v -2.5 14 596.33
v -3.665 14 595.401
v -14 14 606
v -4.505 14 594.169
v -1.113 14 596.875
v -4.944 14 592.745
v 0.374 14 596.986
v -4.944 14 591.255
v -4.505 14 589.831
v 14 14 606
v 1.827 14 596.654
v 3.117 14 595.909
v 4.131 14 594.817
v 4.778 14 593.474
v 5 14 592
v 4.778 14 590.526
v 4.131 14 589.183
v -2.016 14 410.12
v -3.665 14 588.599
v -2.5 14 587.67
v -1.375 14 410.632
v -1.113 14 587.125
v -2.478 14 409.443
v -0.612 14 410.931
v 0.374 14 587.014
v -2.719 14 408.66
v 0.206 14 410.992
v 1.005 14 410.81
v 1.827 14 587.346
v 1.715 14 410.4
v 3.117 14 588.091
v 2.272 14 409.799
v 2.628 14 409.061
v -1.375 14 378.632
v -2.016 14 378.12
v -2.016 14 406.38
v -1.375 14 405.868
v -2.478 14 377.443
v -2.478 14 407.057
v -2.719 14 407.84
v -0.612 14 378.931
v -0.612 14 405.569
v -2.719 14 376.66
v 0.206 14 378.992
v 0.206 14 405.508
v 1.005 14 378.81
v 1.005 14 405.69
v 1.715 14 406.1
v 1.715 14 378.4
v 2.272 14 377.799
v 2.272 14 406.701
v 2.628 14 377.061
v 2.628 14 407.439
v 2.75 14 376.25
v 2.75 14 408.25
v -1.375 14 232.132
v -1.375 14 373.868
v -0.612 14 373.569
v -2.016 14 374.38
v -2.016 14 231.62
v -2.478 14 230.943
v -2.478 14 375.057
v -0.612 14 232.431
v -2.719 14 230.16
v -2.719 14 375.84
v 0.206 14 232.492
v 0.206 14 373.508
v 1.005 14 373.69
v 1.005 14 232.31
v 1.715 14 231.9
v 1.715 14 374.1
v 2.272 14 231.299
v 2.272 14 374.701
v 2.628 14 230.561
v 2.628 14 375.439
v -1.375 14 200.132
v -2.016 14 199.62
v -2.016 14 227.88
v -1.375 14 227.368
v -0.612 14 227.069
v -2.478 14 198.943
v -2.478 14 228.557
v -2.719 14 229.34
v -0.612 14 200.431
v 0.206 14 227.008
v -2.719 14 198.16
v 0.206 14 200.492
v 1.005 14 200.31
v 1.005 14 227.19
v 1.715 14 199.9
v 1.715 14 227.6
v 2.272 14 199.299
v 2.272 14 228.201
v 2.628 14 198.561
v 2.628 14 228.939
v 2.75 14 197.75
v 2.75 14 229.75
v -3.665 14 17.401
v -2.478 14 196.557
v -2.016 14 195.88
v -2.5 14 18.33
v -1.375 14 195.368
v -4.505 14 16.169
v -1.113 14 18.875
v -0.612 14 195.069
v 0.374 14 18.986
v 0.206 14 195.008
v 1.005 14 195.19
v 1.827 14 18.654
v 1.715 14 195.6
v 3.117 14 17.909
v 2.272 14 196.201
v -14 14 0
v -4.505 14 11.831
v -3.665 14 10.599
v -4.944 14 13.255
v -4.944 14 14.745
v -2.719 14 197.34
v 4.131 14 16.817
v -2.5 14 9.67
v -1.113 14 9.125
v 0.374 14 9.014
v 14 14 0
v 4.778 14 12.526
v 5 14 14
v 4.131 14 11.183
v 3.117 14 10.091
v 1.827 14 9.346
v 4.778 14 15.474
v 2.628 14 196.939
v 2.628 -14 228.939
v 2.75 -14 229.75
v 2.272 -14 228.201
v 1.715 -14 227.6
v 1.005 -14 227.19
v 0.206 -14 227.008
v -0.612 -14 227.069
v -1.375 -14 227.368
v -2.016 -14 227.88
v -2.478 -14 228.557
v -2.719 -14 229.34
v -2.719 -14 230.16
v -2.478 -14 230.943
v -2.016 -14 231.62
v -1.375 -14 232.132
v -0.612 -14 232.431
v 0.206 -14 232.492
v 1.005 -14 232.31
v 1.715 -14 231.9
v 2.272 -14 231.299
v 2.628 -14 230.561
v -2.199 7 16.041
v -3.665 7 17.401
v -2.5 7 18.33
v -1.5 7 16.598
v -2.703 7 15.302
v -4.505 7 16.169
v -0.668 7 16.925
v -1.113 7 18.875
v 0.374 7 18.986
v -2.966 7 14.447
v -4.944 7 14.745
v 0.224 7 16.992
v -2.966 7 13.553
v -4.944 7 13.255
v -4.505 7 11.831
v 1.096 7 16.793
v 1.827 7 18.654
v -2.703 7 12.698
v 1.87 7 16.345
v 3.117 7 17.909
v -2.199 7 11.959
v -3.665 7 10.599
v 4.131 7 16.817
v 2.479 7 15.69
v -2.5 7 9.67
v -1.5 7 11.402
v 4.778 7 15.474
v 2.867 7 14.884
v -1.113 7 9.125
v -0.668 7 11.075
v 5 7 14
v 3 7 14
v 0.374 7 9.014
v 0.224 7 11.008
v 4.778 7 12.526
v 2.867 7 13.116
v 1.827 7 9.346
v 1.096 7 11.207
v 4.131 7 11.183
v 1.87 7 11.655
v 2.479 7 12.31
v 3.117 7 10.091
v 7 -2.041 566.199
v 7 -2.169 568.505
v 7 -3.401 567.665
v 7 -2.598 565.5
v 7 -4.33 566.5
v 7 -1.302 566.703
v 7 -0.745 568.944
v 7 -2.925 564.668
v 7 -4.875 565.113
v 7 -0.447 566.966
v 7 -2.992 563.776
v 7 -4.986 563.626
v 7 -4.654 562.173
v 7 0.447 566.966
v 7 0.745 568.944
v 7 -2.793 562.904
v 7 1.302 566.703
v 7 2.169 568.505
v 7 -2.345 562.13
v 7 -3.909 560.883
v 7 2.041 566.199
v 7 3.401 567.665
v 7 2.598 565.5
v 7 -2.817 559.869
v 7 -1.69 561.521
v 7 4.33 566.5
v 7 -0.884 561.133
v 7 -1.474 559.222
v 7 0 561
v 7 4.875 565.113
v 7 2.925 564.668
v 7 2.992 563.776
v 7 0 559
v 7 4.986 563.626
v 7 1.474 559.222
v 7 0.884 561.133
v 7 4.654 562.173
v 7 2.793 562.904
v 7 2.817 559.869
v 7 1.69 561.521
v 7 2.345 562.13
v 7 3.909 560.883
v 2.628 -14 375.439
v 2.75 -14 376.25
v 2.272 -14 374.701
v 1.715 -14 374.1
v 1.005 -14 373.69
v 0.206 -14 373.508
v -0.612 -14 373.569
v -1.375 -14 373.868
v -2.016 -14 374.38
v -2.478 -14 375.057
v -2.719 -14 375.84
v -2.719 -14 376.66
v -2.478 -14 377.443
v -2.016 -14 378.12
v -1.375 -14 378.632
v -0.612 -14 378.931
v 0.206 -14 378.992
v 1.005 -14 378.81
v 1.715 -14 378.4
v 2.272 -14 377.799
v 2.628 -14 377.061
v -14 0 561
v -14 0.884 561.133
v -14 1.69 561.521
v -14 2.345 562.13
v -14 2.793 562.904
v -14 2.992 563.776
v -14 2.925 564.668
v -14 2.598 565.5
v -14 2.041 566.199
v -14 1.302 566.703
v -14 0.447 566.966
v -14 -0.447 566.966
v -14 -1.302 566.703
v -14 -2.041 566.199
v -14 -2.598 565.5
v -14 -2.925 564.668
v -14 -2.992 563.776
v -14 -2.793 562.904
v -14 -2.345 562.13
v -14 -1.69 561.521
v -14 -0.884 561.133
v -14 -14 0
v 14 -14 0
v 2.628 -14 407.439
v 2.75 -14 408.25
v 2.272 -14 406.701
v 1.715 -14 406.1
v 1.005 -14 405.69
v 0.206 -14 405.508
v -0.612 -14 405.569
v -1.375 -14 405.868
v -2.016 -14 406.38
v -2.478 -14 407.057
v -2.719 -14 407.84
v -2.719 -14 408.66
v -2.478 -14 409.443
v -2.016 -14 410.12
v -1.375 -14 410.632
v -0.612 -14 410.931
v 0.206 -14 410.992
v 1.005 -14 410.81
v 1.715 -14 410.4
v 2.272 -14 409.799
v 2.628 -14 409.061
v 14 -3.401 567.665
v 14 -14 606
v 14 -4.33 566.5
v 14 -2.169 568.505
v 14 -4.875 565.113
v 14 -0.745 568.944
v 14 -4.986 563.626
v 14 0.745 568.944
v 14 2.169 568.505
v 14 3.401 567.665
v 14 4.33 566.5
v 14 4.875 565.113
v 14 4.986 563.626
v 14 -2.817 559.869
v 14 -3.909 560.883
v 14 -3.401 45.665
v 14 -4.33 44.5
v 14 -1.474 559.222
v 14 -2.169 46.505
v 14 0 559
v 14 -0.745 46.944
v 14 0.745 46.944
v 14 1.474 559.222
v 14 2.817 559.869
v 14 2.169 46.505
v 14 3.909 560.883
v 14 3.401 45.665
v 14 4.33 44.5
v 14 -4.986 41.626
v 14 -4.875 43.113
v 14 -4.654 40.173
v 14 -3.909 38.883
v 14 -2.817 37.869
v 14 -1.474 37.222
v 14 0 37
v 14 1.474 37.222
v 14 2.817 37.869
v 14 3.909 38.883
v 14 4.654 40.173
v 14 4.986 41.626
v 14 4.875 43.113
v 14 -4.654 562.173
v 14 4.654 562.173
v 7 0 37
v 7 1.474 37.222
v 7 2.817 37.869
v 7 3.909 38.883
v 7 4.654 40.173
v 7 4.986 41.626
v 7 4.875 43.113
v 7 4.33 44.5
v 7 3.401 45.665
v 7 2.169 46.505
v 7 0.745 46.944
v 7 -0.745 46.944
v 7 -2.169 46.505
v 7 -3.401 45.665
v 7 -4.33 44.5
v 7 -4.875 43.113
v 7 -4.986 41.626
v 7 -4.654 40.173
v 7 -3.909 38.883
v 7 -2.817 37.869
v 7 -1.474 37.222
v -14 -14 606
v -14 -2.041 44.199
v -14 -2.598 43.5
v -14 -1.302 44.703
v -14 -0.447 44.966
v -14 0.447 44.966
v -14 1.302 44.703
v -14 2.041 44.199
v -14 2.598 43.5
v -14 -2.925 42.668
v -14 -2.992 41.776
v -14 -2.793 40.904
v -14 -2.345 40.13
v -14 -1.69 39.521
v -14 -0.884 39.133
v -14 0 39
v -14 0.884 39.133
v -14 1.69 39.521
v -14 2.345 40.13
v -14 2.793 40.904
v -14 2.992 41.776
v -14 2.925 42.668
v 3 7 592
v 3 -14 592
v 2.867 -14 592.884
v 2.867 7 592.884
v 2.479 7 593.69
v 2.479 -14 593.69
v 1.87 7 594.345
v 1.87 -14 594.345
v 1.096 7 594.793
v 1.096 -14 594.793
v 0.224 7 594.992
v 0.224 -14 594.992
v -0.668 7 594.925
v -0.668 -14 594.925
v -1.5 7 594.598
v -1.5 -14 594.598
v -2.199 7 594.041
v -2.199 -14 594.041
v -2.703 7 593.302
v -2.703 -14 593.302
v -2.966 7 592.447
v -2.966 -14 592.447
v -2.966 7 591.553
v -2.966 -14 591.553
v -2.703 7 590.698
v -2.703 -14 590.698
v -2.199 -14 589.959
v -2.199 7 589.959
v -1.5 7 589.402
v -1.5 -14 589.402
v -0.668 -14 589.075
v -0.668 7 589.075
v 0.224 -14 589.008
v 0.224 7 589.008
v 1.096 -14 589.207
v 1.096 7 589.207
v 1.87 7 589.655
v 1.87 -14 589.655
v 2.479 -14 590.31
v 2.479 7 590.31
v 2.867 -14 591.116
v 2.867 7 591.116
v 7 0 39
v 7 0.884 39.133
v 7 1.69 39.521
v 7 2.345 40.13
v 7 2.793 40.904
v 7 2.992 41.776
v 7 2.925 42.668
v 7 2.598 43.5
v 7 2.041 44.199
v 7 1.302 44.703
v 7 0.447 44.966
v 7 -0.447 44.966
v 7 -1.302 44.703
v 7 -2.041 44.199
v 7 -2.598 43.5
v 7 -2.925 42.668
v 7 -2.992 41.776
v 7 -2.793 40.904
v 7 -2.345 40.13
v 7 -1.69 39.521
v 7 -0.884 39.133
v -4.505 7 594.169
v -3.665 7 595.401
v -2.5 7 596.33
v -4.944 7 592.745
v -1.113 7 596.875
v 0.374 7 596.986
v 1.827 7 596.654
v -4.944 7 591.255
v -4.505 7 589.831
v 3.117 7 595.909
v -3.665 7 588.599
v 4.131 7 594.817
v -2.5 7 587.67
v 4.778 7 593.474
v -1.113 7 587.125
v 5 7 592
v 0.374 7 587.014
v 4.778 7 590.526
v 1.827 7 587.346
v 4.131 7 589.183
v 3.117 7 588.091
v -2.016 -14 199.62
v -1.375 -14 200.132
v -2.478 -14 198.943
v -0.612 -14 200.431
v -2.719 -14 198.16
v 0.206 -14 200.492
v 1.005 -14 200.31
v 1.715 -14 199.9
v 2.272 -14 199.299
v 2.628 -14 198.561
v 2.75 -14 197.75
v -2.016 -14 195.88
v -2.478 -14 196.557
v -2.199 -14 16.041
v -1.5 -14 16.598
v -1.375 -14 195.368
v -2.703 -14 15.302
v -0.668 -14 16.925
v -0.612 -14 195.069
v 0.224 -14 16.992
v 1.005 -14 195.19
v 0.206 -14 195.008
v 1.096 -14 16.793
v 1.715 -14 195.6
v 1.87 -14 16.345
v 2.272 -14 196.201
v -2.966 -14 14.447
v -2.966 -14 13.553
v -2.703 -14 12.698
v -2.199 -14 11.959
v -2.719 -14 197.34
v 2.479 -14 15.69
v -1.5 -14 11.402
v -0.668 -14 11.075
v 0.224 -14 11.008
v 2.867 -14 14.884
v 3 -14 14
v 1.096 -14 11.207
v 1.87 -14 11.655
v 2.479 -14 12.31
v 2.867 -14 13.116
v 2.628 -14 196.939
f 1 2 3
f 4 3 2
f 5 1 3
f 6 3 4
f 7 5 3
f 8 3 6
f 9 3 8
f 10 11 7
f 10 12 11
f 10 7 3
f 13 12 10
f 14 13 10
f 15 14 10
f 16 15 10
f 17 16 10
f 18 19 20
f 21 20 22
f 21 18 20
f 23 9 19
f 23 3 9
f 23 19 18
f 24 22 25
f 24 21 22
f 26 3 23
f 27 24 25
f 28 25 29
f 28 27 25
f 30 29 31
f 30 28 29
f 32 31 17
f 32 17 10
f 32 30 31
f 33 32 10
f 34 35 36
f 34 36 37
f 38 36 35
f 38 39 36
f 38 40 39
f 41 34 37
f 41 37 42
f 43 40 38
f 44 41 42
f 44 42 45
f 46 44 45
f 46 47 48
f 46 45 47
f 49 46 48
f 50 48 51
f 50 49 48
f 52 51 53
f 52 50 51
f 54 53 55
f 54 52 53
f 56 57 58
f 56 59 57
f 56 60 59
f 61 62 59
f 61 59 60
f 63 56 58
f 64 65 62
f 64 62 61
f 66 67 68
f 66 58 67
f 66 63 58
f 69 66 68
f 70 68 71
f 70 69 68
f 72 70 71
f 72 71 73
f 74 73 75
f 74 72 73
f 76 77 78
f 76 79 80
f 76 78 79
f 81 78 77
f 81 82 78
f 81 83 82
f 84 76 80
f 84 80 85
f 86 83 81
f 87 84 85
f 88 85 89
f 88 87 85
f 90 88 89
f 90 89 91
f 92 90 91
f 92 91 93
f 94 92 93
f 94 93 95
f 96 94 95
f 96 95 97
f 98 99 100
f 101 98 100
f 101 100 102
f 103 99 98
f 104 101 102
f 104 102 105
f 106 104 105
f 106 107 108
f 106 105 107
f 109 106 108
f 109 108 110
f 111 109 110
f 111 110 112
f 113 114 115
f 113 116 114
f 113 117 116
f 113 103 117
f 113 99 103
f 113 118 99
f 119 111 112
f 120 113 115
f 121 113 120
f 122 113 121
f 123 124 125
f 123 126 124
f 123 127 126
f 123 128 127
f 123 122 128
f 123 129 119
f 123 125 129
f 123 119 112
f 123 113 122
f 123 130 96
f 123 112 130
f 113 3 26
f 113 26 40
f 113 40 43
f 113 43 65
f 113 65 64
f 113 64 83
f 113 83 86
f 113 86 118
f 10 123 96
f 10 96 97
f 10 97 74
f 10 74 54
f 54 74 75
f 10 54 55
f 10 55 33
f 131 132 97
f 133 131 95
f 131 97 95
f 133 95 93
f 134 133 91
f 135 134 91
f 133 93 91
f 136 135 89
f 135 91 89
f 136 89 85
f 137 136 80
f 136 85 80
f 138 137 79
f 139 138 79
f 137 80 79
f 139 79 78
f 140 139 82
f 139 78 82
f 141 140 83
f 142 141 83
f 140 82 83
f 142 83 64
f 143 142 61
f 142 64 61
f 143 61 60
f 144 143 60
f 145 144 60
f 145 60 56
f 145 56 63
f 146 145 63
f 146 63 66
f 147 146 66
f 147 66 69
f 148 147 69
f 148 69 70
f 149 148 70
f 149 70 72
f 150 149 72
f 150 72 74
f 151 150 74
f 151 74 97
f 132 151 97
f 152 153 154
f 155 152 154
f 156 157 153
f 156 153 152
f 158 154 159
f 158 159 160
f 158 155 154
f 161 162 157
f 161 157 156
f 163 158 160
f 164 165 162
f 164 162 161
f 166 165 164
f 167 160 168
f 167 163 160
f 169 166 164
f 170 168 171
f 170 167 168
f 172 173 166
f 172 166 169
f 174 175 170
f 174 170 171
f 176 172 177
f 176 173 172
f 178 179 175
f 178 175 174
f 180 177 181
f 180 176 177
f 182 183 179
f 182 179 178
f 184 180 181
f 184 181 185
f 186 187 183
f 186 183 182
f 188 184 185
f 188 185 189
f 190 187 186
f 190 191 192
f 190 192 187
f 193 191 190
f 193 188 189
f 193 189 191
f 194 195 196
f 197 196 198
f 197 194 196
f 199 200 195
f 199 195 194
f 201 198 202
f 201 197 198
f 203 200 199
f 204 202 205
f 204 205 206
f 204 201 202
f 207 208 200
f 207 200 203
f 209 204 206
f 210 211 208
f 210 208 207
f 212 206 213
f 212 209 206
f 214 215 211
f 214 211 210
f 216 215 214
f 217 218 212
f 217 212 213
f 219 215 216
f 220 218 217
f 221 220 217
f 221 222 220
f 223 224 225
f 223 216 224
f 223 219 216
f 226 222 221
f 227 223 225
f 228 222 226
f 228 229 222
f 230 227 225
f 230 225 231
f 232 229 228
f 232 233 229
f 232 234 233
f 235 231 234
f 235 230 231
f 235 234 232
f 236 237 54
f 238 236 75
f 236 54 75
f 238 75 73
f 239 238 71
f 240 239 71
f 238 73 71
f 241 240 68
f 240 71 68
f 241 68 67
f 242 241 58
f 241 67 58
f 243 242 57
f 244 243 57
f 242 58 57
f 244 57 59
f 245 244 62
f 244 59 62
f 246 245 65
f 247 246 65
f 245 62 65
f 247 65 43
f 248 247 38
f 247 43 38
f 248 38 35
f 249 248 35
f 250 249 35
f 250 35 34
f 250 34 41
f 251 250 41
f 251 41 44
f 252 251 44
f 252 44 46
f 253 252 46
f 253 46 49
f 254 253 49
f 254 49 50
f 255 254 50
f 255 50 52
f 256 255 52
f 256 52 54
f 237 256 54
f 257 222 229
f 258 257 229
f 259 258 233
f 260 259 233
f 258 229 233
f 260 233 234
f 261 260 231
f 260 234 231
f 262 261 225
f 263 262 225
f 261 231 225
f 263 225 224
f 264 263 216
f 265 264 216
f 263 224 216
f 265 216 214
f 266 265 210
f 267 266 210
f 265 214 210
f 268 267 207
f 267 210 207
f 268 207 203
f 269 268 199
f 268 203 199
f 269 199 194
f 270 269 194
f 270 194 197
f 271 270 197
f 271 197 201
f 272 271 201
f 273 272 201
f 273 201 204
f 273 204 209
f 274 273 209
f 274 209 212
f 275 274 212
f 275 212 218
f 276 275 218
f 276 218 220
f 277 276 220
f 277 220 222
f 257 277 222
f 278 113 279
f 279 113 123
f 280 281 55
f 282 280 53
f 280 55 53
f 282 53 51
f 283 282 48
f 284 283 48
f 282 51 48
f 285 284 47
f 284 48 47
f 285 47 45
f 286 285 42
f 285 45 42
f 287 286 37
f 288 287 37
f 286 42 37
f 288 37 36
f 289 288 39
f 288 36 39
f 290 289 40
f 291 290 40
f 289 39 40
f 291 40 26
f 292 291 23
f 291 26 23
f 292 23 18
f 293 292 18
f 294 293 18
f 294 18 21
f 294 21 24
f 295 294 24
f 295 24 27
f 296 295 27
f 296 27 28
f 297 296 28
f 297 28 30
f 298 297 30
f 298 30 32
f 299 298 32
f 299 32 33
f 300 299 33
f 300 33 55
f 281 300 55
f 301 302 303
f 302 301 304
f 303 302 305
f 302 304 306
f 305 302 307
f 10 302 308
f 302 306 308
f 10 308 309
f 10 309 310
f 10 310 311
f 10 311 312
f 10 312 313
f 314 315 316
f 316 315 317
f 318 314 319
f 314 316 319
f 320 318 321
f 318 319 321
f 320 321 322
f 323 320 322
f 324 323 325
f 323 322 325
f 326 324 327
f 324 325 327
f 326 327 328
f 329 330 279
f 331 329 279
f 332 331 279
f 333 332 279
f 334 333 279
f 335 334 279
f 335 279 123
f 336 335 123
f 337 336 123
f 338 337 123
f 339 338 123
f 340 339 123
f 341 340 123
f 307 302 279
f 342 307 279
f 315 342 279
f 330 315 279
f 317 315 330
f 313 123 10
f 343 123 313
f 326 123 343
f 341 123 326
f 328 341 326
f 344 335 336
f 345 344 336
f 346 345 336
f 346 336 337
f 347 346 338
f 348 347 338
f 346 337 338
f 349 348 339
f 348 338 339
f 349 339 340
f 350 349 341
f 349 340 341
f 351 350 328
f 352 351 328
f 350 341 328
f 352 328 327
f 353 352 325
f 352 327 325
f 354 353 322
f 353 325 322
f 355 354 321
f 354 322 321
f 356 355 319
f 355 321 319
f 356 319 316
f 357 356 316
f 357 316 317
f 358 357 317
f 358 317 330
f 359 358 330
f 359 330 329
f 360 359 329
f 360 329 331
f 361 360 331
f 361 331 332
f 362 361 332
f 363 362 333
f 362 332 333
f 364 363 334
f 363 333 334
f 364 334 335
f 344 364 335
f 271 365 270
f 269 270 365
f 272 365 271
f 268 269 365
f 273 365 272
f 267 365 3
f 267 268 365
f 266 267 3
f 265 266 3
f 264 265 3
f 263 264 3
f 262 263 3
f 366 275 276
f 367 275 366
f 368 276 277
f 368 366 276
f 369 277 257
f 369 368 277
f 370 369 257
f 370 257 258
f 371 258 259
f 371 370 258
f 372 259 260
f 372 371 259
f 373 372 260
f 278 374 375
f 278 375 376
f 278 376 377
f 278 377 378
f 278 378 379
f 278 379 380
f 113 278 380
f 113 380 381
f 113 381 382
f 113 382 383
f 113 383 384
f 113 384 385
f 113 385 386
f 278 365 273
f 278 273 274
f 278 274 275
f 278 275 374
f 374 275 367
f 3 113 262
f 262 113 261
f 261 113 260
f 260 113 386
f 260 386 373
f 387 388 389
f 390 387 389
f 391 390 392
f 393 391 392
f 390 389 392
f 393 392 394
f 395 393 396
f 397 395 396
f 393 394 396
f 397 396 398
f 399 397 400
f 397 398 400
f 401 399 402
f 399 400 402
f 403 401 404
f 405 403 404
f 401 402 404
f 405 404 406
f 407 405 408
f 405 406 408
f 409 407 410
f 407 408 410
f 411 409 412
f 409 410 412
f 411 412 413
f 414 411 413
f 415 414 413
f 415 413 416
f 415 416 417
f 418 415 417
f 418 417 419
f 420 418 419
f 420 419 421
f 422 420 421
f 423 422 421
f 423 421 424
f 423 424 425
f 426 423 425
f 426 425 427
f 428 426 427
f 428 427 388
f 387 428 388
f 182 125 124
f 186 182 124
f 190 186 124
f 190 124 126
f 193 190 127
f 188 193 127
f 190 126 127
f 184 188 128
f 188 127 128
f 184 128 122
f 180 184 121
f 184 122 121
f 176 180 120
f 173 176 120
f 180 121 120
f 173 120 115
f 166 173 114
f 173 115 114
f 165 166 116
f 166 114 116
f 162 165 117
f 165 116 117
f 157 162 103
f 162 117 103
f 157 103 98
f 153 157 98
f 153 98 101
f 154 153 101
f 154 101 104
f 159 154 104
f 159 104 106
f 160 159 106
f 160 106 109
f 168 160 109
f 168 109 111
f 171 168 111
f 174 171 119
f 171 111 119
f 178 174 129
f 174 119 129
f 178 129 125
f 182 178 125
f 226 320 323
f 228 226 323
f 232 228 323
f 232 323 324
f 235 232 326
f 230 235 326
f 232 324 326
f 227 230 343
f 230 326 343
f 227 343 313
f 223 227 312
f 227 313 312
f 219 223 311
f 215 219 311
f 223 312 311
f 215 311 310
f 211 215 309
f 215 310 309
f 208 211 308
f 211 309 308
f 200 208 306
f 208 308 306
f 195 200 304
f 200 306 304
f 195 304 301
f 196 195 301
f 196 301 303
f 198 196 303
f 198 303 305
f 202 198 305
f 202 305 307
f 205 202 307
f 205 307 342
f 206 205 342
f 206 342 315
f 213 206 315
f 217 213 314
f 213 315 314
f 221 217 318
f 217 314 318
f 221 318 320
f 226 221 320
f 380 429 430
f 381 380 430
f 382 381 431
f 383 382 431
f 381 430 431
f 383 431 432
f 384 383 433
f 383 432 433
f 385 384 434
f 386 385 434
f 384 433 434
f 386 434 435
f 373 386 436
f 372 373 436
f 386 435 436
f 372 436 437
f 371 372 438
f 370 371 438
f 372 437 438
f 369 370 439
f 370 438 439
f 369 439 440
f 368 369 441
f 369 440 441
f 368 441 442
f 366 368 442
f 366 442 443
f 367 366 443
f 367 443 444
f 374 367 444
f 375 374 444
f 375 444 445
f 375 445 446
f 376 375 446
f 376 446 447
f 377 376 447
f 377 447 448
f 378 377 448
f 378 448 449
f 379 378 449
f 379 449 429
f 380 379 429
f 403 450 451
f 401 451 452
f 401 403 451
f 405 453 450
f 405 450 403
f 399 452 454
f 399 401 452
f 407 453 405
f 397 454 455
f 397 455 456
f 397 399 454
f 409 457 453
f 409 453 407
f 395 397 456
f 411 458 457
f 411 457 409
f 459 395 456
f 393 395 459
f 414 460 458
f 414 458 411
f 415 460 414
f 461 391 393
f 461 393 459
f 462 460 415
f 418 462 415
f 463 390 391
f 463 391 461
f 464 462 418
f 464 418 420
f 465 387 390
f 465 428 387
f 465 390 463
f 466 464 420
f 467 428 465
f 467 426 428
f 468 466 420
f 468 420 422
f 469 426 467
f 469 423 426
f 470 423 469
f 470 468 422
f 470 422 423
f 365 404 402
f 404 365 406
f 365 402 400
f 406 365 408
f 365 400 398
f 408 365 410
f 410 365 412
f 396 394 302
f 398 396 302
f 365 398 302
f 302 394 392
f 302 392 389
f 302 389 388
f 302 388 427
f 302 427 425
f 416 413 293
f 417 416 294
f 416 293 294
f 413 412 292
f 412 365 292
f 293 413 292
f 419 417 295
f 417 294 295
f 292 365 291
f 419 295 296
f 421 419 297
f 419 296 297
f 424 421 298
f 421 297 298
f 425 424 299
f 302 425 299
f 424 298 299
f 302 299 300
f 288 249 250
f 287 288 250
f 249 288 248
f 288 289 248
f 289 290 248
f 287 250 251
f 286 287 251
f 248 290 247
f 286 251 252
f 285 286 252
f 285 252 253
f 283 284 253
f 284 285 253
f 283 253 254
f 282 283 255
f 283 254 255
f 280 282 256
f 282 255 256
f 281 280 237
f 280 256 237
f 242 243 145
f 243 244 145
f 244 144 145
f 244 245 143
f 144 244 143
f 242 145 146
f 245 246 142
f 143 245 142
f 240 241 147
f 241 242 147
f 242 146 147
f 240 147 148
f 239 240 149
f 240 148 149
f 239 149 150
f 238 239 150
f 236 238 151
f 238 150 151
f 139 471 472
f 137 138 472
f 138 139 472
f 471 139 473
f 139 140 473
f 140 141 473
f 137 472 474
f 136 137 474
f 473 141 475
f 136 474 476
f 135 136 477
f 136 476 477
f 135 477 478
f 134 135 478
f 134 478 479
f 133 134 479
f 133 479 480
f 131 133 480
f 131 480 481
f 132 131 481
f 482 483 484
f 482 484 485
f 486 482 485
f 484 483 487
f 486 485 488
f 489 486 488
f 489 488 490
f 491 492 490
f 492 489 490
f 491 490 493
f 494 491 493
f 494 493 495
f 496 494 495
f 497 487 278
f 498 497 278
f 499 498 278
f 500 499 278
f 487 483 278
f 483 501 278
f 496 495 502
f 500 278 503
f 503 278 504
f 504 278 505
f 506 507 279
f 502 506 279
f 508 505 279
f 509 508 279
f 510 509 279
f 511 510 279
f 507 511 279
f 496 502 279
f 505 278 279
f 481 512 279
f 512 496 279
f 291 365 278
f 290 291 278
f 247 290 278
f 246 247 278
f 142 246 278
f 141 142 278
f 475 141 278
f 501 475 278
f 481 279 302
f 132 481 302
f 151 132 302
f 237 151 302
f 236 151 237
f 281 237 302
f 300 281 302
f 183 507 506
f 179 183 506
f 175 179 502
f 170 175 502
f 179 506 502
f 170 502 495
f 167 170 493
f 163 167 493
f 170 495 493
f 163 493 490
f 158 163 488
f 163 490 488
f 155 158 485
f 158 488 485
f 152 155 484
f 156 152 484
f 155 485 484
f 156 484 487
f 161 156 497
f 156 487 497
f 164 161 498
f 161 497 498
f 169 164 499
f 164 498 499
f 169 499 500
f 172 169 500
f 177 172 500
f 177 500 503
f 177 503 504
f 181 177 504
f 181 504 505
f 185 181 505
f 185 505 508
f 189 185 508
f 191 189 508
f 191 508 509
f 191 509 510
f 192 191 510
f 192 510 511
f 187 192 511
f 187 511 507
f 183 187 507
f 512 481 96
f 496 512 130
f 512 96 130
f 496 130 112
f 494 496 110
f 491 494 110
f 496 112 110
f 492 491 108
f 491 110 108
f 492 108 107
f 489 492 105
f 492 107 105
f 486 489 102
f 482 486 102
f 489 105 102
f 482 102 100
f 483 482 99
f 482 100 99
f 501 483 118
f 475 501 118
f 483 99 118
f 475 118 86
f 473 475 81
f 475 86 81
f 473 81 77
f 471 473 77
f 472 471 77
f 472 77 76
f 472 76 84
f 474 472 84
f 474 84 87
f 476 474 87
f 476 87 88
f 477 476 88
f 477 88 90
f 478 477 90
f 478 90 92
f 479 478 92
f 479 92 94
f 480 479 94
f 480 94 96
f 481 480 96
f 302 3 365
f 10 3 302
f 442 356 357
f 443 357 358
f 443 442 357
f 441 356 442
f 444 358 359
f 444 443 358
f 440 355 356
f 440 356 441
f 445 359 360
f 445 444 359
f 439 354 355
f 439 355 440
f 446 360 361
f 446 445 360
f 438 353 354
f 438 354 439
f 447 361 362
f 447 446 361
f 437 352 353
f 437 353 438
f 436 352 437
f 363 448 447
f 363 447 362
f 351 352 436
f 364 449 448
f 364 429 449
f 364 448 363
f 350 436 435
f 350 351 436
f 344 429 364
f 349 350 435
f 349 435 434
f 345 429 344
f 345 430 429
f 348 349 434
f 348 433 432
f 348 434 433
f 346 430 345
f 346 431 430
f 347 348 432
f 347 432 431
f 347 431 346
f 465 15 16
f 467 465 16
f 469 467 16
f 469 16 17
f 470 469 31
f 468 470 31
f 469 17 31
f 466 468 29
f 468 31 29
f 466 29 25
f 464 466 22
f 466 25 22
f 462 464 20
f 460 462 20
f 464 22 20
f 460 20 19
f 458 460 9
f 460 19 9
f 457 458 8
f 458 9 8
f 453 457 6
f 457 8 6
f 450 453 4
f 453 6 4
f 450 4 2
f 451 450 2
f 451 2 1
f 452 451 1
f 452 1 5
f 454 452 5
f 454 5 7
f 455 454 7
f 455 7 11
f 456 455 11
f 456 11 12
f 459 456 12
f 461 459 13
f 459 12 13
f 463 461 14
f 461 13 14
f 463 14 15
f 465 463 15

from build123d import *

# Parameters (mm, degrees)
IZIM1_W                     = 28
IZIM1_H                     = 28
Y_KSEKLIK_EKSTR_ZYON1_DEPTH = 606
IZIM2_R                     = 5
KES_EKSTR_ZYON1_DEPTH       = 7
IZIM3_R                     = 3
KES_EKSTR_ZYON2_DEPTH       = 1
KES_EKSTR_ZYON2_DEPTH_BACK  = 29
KES_EKSTR_ZYON3_REACH       = 30
IZIM4_R                     = 3
IZIM6_R                     = 5
KES_EKSTR_ZYON5_DEPTH       = 7
IZIM7_R                     = 2.75
KES_EKSTR_ZYON6_DEPTH       = 29


with BuildPart() as part:
    # Çizim1 → Yükseklik-Ekstrüzyon1 (new body)
    with BuildSketch(Plane.XY):
        Rectangle(IZIM1_W, IZIM1_H)
    extrude(amount=Y_KSEKLIK_EKSTR_ZYON1_DEPTH)

    # Çizim2 → Kes-Ekstrüzyon1 (cut)
    with BuildSketch(Plane(origin=(14, 0, 0), x_dir=(0, 0, -1), z_dir=(1, 0, 0))):
        with Locations((-564, 0)):
            Circle(IZIM2_R)
        with Locations((-42, 0)):
            Circle(IZIM2_R)
    extrude(amount=-KES_EKSTR_ZYON1_DEPTH, mode=Mode.SUBTRACT)

    # Çizim3 → Kes-Ekstrüzyon2 (cut, two sides)
    with BuildSketch(Plane(origin=(14, 0, 0), x_dir=(0, 0, -1), z_dir=(1, 0, 0))) as kes_ekstr_zyon2_sk:
        with Locations((-564, 0)):
            Circle(IZIM3_R)
        with Locations((-42, 0)):
            Circle(IZIM3_R)
    extrude(amount=KES_EKSTR_ZYON2_DEPTH, mode=Mode.SUBTRACT)
    extrude(kes_ekstr_zyon2_sk.sketch, amount=-KES_EKSTR_ZYON2_DEPTH_BACK, mode=Mode.SUBTRACT)

    # Çizim4 → Kes-Ekstrüzyon3 (cut, up to next)
    with BuildSketch(Plane.XZ.offset(14), mode=Mode.PRIVATE) as kes_ekstr_zyon3_sk1:
        with Locations((0, 14)):
            Circle(IZIM4_R)
    kes_ekstr_zyon3_tool1 = extrude(kes_ekstr_zyon3_sk1.sketch, amount=-KES_EKSTR_ZYON3_REACH, mode=Mode.PRIVATE) & part.part
    add(kes_ekstr_zyon3_tool1.solids().sort_by_distance((0, -14, 14))[0], mode=Mode.SUBTRACT)
    # Çizim4 → Kes-Ekstrüzyon3 (cut, up to next)
    with BuildSketch(Plane.XZ.offset(14), mode=Mode.PRIVATE) as kes_ekstr_zyon3_sk2:
        with Locations((0, 592)):
            Circle(IZIM4_R)
    kes_ekstr_zyon3_tool2 = extrude(kes_ekstr_zyon3_sk2.sketch, amount=-KES_EKSTR_ZYON3_REACH, mode=Mode.PRIVATE) & part.part
    add(kes_ekstr_zyon3_tool2.solids().sort_by_distance((0, -14, 592))[0], mode=Mode.SUBTRACT)

    # Çizim6 → Kes-Ekstrüzyon5 (cut)
    with BuildSketch(Plane(origin=(0, 14, 0), x_dir=(1, 0, 0), z_dir=(0, 1, 0))):
        with Locations((0, -592)):
            Circle(IZIM6_R)
        with Locations((0, -14)):
            Circle(IZIM6_R)
    extrude(amount=-KES_EKSTR_ZYON5_DEPTH, mode=Mode.SUBTRACT)

    # Çizim7 → Kes-Ekstrüzyon6 (cut, through all)
    with BuildSketch(Plane(origin=(0, 14, 0), x_dir=(1, 0, 0), z_dir=(0, 1, 0))):
        with Locations((0, -408.25)):
            Circle(IZIM7_R)
        with Locations((0, -376.25)):
            Circle(IZIM7_R)
        with Locations((0, -229.75)):
            Circle(IZIM7_R)
        with Locations((0, -197.75)):
            Circle(IZIM7_R)
    extrude(amount=-KES_EKSTR_ZYON6_DEPTH, mode=Mode.SUBTRACT)


solid = part.part
